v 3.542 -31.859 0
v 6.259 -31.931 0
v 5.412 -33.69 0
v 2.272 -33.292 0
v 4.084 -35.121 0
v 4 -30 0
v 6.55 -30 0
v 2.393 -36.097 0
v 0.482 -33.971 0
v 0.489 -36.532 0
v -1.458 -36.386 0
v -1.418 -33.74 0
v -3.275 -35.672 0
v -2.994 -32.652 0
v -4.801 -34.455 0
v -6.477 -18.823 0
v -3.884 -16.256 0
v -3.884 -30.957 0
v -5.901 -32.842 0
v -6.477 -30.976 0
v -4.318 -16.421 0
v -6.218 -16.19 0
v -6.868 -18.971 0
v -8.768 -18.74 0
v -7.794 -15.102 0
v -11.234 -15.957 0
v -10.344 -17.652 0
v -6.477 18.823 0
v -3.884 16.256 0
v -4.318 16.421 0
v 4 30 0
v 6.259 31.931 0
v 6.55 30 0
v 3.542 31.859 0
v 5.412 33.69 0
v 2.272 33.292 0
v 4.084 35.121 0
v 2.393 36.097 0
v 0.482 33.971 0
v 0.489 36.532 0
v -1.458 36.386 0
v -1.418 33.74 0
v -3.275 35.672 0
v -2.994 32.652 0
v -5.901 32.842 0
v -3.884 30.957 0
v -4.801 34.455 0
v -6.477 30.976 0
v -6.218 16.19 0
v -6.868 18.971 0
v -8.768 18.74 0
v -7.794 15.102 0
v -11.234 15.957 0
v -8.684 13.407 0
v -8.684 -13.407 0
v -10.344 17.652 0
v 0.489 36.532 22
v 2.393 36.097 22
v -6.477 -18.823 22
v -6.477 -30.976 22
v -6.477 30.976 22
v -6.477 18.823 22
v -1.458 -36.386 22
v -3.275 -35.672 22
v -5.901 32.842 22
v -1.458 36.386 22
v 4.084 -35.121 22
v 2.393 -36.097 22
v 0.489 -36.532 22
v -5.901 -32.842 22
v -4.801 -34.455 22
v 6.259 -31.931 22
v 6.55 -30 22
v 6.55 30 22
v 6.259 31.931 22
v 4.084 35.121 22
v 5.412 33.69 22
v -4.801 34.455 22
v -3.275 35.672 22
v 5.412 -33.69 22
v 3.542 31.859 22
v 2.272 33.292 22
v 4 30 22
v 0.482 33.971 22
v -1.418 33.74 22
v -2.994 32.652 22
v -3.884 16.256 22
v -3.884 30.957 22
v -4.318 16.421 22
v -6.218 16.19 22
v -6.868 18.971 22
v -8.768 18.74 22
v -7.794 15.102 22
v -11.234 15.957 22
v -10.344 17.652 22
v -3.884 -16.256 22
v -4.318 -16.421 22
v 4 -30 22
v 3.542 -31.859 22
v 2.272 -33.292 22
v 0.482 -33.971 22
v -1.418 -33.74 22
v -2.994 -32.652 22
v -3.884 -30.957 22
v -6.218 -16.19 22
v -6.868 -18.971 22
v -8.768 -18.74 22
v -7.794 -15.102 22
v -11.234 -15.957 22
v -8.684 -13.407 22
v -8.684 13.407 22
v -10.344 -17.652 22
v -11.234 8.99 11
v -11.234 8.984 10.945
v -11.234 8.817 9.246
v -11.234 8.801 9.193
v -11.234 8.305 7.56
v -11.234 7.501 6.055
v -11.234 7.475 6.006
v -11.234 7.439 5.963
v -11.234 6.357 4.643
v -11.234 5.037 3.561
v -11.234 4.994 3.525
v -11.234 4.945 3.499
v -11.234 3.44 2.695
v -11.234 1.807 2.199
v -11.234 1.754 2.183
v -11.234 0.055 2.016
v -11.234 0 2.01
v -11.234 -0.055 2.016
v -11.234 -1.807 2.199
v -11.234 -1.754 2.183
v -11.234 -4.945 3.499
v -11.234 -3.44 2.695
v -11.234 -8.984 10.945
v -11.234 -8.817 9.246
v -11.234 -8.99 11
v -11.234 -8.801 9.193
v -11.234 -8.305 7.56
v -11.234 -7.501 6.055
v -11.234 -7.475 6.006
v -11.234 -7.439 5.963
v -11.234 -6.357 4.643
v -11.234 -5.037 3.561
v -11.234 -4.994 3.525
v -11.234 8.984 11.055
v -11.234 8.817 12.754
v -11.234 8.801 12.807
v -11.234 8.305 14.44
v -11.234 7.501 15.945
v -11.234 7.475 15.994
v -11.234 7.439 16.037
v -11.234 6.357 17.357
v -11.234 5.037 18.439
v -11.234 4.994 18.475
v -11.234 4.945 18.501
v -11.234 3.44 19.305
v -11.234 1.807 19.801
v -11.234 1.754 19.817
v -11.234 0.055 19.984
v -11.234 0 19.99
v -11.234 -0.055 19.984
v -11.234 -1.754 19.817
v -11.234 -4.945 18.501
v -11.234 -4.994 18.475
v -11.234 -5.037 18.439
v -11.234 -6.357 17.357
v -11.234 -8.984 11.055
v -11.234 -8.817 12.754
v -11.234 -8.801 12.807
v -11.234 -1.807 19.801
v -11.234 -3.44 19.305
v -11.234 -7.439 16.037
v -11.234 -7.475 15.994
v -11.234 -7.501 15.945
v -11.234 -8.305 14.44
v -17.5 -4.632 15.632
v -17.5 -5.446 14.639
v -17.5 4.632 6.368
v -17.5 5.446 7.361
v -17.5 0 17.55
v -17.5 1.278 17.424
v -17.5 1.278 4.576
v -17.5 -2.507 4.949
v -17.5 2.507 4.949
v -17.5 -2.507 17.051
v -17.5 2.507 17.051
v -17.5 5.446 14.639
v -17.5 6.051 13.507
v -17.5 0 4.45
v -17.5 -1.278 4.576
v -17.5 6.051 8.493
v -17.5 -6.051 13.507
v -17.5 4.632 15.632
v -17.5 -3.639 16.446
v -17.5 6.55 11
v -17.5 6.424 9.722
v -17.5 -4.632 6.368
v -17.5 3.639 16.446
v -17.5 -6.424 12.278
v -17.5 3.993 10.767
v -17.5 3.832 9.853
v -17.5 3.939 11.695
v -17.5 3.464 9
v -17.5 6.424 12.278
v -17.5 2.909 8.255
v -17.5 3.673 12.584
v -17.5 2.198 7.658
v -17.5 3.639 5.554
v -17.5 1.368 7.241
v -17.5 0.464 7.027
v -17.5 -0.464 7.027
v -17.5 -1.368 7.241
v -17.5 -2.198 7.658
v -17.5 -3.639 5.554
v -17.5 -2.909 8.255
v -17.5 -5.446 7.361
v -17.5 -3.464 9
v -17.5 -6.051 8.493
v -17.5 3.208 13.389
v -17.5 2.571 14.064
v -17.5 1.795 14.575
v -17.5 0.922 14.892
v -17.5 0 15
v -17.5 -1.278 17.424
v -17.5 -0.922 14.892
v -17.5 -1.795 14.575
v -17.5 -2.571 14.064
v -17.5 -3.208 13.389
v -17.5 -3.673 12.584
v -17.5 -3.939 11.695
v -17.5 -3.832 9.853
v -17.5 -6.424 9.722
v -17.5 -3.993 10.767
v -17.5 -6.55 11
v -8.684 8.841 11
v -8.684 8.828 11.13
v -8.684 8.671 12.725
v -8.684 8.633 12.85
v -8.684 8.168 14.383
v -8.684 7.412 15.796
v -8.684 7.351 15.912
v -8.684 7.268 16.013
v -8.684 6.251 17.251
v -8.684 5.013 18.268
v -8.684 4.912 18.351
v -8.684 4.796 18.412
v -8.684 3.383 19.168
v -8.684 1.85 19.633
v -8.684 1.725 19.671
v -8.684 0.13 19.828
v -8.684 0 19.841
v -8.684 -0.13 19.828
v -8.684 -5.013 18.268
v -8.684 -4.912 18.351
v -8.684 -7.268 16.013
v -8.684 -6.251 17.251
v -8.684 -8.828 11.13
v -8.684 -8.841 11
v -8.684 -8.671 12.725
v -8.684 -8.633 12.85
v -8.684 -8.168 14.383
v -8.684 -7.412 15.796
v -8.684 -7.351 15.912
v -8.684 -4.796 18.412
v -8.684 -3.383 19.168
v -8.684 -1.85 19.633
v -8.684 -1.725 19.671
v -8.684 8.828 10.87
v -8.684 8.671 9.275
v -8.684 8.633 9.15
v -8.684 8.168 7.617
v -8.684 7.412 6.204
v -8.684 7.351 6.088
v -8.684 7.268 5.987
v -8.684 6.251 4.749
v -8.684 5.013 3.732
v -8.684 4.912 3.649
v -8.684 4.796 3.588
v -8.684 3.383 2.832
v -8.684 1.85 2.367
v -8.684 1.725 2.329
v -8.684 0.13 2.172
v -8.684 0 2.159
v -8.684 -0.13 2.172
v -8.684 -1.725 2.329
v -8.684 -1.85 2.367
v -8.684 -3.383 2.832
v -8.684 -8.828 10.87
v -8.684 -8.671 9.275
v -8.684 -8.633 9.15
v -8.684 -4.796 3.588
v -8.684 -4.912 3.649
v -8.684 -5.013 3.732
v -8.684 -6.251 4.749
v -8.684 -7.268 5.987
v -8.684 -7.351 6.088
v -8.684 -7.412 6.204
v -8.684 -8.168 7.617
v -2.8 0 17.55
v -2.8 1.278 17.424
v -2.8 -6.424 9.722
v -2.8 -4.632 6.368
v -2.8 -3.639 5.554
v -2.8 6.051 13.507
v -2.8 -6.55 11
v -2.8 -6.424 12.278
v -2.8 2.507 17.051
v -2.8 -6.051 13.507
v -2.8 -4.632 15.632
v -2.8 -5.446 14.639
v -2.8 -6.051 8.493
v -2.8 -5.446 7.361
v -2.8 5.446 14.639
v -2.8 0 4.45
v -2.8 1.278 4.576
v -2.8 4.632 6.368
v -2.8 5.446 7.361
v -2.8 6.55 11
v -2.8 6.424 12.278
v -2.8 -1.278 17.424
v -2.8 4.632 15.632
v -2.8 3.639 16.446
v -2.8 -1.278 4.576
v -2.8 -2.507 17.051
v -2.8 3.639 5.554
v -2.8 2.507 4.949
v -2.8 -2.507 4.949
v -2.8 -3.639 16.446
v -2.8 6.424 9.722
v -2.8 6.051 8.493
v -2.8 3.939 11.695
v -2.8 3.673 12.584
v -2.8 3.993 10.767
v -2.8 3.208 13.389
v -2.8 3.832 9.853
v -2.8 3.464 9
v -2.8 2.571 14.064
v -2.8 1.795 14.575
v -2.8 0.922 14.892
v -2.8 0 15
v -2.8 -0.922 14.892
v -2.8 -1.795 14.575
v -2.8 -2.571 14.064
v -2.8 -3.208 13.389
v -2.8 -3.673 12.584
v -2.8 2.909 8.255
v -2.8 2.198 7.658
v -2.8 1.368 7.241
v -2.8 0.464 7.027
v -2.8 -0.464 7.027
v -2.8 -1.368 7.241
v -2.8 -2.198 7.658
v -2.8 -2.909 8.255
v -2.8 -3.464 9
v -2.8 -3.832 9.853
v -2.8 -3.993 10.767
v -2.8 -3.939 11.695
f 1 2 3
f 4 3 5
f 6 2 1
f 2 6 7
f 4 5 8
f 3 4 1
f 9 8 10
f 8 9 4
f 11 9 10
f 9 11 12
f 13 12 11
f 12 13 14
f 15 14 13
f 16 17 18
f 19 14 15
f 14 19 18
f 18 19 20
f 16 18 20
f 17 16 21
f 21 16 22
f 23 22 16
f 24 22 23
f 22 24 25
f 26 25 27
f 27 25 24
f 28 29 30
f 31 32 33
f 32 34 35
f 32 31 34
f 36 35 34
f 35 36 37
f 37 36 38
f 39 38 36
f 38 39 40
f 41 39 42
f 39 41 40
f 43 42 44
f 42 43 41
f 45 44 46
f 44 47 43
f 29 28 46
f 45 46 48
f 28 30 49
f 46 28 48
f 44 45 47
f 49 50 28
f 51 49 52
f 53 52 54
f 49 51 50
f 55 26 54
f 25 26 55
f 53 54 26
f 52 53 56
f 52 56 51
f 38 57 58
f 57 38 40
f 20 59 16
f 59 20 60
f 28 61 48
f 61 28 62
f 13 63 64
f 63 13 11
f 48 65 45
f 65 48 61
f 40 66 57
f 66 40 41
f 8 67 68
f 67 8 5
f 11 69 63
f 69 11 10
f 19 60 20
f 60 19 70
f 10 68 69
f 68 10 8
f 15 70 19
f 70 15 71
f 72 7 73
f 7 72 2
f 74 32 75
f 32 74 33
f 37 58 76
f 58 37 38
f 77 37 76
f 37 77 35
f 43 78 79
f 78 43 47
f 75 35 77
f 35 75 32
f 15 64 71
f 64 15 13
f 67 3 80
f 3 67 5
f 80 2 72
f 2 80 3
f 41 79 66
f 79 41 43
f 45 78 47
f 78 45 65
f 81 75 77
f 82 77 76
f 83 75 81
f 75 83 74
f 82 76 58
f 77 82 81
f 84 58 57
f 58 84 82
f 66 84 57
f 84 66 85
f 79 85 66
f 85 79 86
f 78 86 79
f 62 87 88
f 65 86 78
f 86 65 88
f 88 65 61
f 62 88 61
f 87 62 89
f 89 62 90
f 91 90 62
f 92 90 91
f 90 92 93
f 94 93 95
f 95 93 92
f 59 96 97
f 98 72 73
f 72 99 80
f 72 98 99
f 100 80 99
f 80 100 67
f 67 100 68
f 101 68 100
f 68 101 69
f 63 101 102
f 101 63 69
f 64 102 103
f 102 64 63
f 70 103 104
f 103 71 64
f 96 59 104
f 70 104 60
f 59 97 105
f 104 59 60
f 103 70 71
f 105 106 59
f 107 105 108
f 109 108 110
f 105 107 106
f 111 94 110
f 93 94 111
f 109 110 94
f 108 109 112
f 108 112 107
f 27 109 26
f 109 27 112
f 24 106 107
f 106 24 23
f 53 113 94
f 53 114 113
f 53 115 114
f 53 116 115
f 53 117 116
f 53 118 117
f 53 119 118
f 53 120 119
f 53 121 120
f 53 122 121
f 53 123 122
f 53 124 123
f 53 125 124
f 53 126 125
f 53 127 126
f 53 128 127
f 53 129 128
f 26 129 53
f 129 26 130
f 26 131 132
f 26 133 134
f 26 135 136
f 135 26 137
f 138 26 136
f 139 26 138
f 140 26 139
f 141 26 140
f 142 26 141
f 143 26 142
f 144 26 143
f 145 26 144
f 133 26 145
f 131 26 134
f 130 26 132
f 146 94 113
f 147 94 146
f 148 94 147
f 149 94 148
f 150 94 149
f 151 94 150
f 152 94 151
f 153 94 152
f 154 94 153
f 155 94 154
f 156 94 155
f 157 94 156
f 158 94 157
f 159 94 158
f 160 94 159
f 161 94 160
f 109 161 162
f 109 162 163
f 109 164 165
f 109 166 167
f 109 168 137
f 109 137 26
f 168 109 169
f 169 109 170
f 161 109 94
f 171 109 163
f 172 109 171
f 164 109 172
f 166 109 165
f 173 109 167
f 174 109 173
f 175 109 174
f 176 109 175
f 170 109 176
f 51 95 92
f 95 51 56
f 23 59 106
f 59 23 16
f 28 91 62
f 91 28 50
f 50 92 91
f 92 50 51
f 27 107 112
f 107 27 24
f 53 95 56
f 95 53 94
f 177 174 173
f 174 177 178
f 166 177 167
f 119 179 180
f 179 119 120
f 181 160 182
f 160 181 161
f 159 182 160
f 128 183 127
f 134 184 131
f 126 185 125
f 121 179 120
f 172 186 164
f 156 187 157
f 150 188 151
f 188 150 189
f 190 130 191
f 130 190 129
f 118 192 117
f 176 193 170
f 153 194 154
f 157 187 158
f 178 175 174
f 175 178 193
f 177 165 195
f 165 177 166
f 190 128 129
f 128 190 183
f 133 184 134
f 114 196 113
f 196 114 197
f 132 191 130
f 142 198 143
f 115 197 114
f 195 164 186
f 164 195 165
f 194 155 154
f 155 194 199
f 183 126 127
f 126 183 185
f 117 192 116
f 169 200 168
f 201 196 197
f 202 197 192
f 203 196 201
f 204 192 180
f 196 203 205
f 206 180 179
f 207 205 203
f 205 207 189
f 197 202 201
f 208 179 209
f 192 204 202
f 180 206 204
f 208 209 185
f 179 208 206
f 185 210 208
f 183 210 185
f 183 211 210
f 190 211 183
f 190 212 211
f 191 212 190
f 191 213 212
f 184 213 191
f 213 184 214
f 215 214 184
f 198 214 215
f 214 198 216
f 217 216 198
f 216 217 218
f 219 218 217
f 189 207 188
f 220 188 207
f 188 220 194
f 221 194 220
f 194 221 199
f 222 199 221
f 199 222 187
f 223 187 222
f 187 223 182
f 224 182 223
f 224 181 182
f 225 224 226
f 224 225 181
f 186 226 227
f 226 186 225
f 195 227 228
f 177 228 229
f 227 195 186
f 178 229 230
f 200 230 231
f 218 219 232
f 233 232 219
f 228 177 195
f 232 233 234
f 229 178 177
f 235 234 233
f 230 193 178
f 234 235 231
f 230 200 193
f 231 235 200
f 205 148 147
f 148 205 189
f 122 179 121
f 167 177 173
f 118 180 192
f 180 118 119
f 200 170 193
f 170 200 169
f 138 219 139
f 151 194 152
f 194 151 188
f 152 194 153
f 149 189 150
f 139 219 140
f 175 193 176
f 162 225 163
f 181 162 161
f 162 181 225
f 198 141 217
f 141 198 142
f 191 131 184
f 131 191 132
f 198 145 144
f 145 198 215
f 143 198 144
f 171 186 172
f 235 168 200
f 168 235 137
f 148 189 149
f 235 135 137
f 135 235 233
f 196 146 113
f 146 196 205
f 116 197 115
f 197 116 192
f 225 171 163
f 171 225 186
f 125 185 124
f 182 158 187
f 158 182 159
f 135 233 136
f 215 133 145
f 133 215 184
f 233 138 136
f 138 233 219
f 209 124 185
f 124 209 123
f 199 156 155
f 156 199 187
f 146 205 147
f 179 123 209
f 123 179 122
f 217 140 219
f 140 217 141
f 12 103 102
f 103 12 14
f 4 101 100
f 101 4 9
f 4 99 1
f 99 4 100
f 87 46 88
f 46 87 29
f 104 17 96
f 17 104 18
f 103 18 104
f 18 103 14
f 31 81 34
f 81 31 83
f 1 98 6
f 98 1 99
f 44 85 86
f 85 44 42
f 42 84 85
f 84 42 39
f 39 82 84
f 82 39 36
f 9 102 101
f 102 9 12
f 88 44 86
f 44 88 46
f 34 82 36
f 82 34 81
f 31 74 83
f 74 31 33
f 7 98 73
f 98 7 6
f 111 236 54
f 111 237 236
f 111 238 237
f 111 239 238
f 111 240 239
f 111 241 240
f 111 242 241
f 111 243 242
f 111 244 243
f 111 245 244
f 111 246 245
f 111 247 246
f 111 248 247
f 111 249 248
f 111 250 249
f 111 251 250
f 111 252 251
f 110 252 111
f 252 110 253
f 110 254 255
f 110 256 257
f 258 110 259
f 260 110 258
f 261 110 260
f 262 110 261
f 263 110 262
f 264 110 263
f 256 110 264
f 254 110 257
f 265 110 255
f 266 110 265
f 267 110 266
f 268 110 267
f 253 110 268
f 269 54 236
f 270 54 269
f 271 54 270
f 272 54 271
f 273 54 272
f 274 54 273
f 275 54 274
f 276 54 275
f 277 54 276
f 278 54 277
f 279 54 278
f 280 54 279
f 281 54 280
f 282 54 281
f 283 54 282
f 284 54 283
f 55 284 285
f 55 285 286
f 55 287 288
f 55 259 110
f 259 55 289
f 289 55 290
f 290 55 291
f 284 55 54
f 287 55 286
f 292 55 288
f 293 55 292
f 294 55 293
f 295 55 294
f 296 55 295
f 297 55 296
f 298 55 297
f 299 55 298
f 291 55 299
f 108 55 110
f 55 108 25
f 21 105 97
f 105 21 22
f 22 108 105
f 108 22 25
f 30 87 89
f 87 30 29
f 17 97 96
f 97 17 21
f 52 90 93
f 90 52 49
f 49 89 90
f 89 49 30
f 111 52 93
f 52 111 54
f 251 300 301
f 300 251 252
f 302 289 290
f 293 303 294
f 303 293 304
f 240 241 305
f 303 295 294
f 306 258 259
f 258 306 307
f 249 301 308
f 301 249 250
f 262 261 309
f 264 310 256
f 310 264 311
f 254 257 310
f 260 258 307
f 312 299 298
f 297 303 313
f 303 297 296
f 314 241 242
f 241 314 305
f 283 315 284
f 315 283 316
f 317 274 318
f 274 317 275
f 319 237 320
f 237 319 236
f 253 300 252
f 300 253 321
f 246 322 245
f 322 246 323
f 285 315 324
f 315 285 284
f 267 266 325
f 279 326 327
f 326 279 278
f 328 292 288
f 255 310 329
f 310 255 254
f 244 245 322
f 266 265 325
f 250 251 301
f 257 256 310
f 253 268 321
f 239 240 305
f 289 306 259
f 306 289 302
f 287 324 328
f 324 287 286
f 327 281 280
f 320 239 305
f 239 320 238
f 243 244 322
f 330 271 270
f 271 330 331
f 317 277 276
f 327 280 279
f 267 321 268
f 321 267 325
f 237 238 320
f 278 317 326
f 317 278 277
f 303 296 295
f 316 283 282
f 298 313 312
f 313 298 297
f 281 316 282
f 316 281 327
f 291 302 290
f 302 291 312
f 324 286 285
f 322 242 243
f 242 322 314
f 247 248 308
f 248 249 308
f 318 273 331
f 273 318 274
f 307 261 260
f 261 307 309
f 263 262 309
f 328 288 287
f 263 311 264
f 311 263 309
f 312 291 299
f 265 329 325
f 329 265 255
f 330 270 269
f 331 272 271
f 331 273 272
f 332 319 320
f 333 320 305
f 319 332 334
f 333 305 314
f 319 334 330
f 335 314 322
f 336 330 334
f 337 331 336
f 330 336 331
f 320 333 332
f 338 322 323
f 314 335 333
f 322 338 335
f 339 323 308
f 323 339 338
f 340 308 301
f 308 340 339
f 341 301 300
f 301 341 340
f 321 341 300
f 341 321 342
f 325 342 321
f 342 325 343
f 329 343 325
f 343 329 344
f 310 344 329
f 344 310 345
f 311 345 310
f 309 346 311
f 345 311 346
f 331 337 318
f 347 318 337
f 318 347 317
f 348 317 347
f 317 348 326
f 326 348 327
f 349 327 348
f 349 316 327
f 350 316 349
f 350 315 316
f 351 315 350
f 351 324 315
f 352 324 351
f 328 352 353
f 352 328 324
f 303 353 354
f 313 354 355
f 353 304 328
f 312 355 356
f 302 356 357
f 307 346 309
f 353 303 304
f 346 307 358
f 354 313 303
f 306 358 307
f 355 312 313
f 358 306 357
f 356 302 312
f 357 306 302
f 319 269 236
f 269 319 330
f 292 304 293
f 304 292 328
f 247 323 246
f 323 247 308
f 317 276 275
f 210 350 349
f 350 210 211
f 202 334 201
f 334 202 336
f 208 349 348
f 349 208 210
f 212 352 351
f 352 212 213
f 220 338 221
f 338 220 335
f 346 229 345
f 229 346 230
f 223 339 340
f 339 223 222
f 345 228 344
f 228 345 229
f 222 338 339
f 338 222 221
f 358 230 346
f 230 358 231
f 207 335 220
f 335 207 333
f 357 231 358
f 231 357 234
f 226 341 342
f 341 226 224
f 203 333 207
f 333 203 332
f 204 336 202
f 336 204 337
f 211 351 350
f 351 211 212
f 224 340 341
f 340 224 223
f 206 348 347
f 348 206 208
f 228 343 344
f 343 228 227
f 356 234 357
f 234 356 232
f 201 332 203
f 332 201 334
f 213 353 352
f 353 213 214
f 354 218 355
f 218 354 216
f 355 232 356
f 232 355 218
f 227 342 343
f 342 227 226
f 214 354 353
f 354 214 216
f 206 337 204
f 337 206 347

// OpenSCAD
// distance between parallel rod centers
bar_distance = 60;
// parallel rods diameter
bar_diameter = 8;
// distance between belt loop 
belt_distance = 30;
// desired wall thickness
wall_thickness = 2.55; //[1:.25:5]
// extra height for base
base_height = 14;  //7:1:25]
// rod diameter
rod_diameter = 8;

//Calculated for reuse
bar_radius = bar_diameter/2;
rod_radius = rod_diameter/2;
total_base_height = base_height + rod_diameter;

difference(){
  union(){
    difference(){
      union(){
        hull(){
          translate([0, -bar_distance/2, 0])
            cylinder(total_base_height, bar_radius+wall_thickness, bar_radius+wall_thickness);
          translate([0, bar_distance/2, 0])
            cylinder(total_base_height, bar_radius+wall_thickness, bar_radius+wall_thickness);
        }
        /* Belt saver wall */
        translate([-(1.2*bar_radius+wall_thickness), 0, 0])
        hull(){
          translate([0, -belt_distance/2, 0])
            cylinder(total_base_height, bar_radius, bar_radius);
          translate([0, belt_distance/2, 0])
            cylinder(total_base_height, bar_radius, bar_radius);
        }
        /*Spool rod fixture reinforcement*/
        translate([-2.1*bar_radius-wall_thickness, 0, total_base_height/2])
          rotate([0,-90,0])cylinder(rod_radius+wall_thickness, rod_radius+2*wall_thickness, rod_radius+wall_thickness, $fn=32);
      }
      /* Openning */
      hull(){
        translate([0, -bar_distance/2, 0])
          cylinder(total_base_height, bar_radius, bar_radius);
        translate([0, bar_distance/2, 0])
          cylinder(total_base_height, bar_radius, bar_radius);
      }
      /*Front opennig*/
      translate([bar_radius, -bar_distance/2,0])
        cube([bar_diameter, bar_distance, total_base_height]);
  
      /* Belt saver */
      translate([-1.2*bar_radius, 0, 0])
      hull(){
        translate([0, -(belt_distance/2-wall_thickness), 0])
          cylinder(total_base_height, bar_radius, bar_radius);
        translate([0, belt_distance/2-wall_thickness, 0])
          cylinder(total_base_height, bar_radius, bar_radius);
      }
    }
    /*Spool rod fixture reinforcement 2*/
    translate([-.7*bar_radius, 0, total_base_height/2])
      rotate([0,-90,0])
        cylinder(rod_radius+wall_thickness, rod_radius+wall_thickness, rod_radius+2*wall_thickness, $fn=32);
  }
  /*Spool rod fixture*/
  translate([0, 0, total_base_height/2])
  rotate([0,-90,0]) 
    cylinder(3*(rod_radius+wall_thickness), rod_radius, rod_radius, $fn=27);
}
